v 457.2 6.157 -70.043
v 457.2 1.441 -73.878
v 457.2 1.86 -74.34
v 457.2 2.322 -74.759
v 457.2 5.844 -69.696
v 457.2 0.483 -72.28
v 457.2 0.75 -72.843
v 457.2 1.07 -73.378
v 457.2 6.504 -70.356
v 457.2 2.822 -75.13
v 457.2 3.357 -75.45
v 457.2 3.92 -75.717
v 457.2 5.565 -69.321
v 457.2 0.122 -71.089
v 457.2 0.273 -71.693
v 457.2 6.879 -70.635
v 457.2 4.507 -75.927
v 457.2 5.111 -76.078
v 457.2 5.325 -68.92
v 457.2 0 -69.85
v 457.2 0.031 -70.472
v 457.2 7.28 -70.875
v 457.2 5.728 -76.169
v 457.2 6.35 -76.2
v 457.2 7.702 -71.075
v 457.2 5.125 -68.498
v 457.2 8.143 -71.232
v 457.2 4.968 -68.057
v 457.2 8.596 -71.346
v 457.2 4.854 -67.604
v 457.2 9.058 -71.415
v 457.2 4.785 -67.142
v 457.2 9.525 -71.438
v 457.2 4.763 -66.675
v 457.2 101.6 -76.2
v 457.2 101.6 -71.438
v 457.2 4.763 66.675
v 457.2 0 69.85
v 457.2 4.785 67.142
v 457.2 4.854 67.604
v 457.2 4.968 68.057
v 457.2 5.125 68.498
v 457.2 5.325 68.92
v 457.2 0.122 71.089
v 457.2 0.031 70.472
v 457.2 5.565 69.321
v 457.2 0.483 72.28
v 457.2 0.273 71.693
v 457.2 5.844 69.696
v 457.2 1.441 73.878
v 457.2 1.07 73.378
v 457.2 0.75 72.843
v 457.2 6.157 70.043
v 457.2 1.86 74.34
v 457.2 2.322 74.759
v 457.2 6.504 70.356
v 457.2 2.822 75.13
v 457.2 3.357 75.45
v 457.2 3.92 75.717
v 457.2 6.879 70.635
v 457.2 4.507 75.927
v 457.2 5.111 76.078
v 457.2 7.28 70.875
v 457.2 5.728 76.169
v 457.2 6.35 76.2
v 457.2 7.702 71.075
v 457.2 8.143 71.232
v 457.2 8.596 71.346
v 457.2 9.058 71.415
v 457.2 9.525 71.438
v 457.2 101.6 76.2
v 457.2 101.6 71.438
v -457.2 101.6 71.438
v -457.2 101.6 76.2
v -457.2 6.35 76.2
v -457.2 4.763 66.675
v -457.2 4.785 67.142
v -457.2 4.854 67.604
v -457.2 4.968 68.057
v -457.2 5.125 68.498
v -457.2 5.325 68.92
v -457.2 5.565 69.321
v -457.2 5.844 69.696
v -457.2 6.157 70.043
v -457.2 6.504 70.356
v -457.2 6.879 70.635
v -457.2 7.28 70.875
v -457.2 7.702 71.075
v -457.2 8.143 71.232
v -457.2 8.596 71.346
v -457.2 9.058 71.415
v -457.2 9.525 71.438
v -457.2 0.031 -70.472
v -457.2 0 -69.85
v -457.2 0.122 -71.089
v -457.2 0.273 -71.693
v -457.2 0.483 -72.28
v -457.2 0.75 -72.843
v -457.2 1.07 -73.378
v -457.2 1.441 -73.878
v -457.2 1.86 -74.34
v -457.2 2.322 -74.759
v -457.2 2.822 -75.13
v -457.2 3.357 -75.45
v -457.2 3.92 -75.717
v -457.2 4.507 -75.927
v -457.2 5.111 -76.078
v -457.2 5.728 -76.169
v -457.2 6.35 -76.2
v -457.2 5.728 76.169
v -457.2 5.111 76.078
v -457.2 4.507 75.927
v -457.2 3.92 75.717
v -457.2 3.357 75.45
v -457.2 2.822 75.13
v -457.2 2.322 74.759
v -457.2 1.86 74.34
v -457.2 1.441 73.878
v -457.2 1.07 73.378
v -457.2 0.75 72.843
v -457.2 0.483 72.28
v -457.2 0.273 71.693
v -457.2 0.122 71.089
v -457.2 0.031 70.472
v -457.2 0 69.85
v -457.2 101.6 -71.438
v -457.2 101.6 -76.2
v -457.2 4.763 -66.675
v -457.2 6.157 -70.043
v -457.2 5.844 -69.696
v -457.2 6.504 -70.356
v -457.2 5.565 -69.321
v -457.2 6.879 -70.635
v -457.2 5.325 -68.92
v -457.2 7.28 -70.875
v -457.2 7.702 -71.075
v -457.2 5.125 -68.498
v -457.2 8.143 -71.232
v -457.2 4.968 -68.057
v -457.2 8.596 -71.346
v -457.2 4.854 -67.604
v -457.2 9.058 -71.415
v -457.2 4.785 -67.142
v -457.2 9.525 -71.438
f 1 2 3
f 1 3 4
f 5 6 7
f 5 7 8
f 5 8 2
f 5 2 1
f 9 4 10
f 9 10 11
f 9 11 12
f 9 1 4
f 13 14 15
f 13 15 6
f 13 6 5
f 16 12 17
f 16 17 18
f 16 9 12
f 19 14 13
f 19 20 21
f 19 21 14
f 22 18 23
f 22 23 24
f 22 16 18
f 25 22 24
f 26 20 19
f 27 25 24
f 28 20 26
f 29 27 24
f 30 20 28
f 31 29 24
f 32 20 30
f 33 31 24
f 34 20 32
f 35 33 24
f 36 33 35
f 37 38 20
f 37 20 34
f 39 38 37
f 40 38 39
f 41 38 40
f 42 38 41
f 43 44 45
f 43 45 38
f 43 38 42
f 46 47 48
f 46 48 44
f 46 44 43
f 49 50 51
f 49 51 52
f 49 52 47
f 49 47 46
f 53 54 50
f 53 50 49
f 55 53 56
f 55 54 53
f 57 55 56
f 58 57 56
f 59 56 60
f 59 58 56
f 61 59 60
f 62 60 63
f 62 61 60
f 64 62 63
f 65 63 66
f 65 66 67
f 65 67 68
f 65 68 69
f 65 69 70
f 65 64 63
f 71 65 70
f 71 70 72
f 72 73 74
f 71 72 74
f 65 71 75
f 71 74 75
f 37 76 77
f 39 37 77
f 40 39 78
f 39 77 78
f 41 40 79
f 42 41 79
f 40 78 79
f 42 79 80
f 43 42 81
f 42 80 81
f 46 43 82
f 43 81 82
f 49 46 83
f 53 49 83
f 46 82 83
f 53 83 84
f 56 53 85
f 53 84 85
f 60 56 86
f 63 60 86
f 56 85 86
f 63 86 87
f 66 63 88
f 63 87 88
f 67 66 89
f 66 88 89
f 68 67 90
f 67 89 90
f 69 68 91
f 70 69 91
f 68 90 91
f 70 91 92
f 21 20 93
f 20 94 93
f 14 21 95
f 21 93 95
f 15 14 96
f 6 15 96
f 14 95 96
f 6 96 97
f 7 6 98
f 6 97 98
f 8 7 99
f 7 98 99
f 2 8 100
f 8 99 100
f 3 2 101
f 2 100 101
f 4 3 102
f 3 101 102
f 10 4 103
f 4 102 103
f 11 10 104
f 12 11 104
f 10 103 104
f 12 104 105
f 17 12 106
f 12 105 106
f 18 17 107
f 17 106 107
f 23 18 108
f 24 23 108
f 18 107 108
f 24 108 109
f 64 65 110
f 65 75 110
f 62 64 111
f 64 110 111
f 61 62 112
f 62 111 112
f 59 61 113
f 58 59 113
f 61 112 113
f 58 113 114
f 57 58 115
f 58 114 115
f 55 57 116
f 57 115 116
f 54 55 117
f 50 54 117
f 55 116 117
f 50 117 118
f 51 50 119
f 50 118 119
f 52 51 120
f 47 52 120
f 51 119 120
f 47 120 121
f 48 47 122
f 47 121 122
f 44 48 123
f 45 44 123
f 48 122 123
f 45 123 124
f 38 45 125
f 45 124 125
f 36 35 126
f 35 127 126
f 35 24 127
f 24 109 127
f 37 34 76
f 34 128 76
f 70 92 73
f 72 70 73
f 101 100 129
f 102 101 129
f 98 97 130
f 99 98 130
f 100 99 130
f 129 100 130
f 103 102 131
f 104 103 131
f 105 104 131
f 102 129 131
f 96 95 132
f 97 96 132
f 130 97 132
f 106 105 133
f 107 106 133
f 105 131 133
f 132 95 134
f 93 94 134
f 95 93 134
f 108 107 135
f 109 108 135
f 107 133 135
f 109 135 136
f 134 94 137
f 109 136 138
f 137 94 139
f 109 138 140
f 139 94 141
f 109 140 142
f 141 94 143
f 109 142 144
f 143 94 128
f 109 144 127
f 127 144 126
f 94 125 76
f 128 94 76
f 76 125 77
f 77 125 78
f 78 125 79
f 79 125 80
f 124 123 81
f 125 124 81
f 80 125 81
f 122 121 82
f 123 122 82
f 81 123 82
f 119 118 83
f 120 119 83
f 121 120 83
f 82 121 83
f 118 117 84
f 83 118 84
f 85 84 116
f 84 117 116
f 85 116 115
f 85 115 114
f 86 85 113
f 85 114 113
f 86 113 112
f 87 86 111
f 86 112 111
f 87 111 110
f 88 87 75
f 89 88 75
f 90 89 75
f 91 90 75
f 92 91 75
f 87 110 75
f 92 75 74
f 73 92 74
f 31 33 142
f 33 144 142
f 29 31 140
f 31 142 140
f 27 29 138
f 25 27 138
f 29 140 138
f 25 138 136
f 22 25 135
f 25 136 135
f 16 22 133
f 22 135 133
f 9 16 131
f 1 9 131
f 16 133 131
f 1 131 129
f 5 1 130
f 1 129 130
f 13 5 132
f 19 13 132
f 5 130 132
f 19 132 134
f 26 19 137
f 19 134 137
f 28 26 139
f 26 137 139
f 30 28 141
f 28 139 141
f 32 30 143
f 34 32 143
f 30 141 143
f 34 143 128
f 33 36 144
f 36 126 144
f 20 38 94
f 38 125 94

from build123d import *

# Parameters (mm, degrees)
F1_DEPTH      = 457.2
F1_DEPTH_BACK = 457.2


with BuildPart() as f1:
    # F0 (on Right) → F1 (new body, two sides)
    with BuildSketch(Plane.YZ) as f1_sk:
        with BuildLine():
            Line((101.6, 71.4375), (101.6, 76.2))
            Line((101.6, 76.2), (6.35, 76.2))
            ThreePointArc((6.35, 76.2), (1.8598719395, 74.3401280605), (0, 69.85))
            Line((0, 69.85), (0, 0))
            Line((0, 0), (0, -69.85))
            ThreePointArc((0, -69.85), (1.8598719395, -74.3401280605), (6.35, -76.2))
            Line((6.35, -76.2), (101.6, -76.2))
            Line((101.6, -76.2), (101.6, -71.4375))
            Line((101.6, -71.4375), (9.525, -71.4375))
            ThreePointArc((9.525, -71.4375), (6.1574039546, -70.0425960454), (4.7625, -66.675))
            Line((4.7625, -66.675), (4.7625, 0))
            Line((4.7625, 0), (4.7625, 66.675))
            ThreePointArc((4.7625, 66.675), (6.1574039546, 70.0425960454), (9.525, 71.4375))
            Line((9.525, 71.4375), (101.6, 71.4375))
        make_face()
    extrude(amount=-F1_DEPTH)
    extrude(f1_sk.sketch, amount=F1_DEPTH_BACK)


solid = f1.part
